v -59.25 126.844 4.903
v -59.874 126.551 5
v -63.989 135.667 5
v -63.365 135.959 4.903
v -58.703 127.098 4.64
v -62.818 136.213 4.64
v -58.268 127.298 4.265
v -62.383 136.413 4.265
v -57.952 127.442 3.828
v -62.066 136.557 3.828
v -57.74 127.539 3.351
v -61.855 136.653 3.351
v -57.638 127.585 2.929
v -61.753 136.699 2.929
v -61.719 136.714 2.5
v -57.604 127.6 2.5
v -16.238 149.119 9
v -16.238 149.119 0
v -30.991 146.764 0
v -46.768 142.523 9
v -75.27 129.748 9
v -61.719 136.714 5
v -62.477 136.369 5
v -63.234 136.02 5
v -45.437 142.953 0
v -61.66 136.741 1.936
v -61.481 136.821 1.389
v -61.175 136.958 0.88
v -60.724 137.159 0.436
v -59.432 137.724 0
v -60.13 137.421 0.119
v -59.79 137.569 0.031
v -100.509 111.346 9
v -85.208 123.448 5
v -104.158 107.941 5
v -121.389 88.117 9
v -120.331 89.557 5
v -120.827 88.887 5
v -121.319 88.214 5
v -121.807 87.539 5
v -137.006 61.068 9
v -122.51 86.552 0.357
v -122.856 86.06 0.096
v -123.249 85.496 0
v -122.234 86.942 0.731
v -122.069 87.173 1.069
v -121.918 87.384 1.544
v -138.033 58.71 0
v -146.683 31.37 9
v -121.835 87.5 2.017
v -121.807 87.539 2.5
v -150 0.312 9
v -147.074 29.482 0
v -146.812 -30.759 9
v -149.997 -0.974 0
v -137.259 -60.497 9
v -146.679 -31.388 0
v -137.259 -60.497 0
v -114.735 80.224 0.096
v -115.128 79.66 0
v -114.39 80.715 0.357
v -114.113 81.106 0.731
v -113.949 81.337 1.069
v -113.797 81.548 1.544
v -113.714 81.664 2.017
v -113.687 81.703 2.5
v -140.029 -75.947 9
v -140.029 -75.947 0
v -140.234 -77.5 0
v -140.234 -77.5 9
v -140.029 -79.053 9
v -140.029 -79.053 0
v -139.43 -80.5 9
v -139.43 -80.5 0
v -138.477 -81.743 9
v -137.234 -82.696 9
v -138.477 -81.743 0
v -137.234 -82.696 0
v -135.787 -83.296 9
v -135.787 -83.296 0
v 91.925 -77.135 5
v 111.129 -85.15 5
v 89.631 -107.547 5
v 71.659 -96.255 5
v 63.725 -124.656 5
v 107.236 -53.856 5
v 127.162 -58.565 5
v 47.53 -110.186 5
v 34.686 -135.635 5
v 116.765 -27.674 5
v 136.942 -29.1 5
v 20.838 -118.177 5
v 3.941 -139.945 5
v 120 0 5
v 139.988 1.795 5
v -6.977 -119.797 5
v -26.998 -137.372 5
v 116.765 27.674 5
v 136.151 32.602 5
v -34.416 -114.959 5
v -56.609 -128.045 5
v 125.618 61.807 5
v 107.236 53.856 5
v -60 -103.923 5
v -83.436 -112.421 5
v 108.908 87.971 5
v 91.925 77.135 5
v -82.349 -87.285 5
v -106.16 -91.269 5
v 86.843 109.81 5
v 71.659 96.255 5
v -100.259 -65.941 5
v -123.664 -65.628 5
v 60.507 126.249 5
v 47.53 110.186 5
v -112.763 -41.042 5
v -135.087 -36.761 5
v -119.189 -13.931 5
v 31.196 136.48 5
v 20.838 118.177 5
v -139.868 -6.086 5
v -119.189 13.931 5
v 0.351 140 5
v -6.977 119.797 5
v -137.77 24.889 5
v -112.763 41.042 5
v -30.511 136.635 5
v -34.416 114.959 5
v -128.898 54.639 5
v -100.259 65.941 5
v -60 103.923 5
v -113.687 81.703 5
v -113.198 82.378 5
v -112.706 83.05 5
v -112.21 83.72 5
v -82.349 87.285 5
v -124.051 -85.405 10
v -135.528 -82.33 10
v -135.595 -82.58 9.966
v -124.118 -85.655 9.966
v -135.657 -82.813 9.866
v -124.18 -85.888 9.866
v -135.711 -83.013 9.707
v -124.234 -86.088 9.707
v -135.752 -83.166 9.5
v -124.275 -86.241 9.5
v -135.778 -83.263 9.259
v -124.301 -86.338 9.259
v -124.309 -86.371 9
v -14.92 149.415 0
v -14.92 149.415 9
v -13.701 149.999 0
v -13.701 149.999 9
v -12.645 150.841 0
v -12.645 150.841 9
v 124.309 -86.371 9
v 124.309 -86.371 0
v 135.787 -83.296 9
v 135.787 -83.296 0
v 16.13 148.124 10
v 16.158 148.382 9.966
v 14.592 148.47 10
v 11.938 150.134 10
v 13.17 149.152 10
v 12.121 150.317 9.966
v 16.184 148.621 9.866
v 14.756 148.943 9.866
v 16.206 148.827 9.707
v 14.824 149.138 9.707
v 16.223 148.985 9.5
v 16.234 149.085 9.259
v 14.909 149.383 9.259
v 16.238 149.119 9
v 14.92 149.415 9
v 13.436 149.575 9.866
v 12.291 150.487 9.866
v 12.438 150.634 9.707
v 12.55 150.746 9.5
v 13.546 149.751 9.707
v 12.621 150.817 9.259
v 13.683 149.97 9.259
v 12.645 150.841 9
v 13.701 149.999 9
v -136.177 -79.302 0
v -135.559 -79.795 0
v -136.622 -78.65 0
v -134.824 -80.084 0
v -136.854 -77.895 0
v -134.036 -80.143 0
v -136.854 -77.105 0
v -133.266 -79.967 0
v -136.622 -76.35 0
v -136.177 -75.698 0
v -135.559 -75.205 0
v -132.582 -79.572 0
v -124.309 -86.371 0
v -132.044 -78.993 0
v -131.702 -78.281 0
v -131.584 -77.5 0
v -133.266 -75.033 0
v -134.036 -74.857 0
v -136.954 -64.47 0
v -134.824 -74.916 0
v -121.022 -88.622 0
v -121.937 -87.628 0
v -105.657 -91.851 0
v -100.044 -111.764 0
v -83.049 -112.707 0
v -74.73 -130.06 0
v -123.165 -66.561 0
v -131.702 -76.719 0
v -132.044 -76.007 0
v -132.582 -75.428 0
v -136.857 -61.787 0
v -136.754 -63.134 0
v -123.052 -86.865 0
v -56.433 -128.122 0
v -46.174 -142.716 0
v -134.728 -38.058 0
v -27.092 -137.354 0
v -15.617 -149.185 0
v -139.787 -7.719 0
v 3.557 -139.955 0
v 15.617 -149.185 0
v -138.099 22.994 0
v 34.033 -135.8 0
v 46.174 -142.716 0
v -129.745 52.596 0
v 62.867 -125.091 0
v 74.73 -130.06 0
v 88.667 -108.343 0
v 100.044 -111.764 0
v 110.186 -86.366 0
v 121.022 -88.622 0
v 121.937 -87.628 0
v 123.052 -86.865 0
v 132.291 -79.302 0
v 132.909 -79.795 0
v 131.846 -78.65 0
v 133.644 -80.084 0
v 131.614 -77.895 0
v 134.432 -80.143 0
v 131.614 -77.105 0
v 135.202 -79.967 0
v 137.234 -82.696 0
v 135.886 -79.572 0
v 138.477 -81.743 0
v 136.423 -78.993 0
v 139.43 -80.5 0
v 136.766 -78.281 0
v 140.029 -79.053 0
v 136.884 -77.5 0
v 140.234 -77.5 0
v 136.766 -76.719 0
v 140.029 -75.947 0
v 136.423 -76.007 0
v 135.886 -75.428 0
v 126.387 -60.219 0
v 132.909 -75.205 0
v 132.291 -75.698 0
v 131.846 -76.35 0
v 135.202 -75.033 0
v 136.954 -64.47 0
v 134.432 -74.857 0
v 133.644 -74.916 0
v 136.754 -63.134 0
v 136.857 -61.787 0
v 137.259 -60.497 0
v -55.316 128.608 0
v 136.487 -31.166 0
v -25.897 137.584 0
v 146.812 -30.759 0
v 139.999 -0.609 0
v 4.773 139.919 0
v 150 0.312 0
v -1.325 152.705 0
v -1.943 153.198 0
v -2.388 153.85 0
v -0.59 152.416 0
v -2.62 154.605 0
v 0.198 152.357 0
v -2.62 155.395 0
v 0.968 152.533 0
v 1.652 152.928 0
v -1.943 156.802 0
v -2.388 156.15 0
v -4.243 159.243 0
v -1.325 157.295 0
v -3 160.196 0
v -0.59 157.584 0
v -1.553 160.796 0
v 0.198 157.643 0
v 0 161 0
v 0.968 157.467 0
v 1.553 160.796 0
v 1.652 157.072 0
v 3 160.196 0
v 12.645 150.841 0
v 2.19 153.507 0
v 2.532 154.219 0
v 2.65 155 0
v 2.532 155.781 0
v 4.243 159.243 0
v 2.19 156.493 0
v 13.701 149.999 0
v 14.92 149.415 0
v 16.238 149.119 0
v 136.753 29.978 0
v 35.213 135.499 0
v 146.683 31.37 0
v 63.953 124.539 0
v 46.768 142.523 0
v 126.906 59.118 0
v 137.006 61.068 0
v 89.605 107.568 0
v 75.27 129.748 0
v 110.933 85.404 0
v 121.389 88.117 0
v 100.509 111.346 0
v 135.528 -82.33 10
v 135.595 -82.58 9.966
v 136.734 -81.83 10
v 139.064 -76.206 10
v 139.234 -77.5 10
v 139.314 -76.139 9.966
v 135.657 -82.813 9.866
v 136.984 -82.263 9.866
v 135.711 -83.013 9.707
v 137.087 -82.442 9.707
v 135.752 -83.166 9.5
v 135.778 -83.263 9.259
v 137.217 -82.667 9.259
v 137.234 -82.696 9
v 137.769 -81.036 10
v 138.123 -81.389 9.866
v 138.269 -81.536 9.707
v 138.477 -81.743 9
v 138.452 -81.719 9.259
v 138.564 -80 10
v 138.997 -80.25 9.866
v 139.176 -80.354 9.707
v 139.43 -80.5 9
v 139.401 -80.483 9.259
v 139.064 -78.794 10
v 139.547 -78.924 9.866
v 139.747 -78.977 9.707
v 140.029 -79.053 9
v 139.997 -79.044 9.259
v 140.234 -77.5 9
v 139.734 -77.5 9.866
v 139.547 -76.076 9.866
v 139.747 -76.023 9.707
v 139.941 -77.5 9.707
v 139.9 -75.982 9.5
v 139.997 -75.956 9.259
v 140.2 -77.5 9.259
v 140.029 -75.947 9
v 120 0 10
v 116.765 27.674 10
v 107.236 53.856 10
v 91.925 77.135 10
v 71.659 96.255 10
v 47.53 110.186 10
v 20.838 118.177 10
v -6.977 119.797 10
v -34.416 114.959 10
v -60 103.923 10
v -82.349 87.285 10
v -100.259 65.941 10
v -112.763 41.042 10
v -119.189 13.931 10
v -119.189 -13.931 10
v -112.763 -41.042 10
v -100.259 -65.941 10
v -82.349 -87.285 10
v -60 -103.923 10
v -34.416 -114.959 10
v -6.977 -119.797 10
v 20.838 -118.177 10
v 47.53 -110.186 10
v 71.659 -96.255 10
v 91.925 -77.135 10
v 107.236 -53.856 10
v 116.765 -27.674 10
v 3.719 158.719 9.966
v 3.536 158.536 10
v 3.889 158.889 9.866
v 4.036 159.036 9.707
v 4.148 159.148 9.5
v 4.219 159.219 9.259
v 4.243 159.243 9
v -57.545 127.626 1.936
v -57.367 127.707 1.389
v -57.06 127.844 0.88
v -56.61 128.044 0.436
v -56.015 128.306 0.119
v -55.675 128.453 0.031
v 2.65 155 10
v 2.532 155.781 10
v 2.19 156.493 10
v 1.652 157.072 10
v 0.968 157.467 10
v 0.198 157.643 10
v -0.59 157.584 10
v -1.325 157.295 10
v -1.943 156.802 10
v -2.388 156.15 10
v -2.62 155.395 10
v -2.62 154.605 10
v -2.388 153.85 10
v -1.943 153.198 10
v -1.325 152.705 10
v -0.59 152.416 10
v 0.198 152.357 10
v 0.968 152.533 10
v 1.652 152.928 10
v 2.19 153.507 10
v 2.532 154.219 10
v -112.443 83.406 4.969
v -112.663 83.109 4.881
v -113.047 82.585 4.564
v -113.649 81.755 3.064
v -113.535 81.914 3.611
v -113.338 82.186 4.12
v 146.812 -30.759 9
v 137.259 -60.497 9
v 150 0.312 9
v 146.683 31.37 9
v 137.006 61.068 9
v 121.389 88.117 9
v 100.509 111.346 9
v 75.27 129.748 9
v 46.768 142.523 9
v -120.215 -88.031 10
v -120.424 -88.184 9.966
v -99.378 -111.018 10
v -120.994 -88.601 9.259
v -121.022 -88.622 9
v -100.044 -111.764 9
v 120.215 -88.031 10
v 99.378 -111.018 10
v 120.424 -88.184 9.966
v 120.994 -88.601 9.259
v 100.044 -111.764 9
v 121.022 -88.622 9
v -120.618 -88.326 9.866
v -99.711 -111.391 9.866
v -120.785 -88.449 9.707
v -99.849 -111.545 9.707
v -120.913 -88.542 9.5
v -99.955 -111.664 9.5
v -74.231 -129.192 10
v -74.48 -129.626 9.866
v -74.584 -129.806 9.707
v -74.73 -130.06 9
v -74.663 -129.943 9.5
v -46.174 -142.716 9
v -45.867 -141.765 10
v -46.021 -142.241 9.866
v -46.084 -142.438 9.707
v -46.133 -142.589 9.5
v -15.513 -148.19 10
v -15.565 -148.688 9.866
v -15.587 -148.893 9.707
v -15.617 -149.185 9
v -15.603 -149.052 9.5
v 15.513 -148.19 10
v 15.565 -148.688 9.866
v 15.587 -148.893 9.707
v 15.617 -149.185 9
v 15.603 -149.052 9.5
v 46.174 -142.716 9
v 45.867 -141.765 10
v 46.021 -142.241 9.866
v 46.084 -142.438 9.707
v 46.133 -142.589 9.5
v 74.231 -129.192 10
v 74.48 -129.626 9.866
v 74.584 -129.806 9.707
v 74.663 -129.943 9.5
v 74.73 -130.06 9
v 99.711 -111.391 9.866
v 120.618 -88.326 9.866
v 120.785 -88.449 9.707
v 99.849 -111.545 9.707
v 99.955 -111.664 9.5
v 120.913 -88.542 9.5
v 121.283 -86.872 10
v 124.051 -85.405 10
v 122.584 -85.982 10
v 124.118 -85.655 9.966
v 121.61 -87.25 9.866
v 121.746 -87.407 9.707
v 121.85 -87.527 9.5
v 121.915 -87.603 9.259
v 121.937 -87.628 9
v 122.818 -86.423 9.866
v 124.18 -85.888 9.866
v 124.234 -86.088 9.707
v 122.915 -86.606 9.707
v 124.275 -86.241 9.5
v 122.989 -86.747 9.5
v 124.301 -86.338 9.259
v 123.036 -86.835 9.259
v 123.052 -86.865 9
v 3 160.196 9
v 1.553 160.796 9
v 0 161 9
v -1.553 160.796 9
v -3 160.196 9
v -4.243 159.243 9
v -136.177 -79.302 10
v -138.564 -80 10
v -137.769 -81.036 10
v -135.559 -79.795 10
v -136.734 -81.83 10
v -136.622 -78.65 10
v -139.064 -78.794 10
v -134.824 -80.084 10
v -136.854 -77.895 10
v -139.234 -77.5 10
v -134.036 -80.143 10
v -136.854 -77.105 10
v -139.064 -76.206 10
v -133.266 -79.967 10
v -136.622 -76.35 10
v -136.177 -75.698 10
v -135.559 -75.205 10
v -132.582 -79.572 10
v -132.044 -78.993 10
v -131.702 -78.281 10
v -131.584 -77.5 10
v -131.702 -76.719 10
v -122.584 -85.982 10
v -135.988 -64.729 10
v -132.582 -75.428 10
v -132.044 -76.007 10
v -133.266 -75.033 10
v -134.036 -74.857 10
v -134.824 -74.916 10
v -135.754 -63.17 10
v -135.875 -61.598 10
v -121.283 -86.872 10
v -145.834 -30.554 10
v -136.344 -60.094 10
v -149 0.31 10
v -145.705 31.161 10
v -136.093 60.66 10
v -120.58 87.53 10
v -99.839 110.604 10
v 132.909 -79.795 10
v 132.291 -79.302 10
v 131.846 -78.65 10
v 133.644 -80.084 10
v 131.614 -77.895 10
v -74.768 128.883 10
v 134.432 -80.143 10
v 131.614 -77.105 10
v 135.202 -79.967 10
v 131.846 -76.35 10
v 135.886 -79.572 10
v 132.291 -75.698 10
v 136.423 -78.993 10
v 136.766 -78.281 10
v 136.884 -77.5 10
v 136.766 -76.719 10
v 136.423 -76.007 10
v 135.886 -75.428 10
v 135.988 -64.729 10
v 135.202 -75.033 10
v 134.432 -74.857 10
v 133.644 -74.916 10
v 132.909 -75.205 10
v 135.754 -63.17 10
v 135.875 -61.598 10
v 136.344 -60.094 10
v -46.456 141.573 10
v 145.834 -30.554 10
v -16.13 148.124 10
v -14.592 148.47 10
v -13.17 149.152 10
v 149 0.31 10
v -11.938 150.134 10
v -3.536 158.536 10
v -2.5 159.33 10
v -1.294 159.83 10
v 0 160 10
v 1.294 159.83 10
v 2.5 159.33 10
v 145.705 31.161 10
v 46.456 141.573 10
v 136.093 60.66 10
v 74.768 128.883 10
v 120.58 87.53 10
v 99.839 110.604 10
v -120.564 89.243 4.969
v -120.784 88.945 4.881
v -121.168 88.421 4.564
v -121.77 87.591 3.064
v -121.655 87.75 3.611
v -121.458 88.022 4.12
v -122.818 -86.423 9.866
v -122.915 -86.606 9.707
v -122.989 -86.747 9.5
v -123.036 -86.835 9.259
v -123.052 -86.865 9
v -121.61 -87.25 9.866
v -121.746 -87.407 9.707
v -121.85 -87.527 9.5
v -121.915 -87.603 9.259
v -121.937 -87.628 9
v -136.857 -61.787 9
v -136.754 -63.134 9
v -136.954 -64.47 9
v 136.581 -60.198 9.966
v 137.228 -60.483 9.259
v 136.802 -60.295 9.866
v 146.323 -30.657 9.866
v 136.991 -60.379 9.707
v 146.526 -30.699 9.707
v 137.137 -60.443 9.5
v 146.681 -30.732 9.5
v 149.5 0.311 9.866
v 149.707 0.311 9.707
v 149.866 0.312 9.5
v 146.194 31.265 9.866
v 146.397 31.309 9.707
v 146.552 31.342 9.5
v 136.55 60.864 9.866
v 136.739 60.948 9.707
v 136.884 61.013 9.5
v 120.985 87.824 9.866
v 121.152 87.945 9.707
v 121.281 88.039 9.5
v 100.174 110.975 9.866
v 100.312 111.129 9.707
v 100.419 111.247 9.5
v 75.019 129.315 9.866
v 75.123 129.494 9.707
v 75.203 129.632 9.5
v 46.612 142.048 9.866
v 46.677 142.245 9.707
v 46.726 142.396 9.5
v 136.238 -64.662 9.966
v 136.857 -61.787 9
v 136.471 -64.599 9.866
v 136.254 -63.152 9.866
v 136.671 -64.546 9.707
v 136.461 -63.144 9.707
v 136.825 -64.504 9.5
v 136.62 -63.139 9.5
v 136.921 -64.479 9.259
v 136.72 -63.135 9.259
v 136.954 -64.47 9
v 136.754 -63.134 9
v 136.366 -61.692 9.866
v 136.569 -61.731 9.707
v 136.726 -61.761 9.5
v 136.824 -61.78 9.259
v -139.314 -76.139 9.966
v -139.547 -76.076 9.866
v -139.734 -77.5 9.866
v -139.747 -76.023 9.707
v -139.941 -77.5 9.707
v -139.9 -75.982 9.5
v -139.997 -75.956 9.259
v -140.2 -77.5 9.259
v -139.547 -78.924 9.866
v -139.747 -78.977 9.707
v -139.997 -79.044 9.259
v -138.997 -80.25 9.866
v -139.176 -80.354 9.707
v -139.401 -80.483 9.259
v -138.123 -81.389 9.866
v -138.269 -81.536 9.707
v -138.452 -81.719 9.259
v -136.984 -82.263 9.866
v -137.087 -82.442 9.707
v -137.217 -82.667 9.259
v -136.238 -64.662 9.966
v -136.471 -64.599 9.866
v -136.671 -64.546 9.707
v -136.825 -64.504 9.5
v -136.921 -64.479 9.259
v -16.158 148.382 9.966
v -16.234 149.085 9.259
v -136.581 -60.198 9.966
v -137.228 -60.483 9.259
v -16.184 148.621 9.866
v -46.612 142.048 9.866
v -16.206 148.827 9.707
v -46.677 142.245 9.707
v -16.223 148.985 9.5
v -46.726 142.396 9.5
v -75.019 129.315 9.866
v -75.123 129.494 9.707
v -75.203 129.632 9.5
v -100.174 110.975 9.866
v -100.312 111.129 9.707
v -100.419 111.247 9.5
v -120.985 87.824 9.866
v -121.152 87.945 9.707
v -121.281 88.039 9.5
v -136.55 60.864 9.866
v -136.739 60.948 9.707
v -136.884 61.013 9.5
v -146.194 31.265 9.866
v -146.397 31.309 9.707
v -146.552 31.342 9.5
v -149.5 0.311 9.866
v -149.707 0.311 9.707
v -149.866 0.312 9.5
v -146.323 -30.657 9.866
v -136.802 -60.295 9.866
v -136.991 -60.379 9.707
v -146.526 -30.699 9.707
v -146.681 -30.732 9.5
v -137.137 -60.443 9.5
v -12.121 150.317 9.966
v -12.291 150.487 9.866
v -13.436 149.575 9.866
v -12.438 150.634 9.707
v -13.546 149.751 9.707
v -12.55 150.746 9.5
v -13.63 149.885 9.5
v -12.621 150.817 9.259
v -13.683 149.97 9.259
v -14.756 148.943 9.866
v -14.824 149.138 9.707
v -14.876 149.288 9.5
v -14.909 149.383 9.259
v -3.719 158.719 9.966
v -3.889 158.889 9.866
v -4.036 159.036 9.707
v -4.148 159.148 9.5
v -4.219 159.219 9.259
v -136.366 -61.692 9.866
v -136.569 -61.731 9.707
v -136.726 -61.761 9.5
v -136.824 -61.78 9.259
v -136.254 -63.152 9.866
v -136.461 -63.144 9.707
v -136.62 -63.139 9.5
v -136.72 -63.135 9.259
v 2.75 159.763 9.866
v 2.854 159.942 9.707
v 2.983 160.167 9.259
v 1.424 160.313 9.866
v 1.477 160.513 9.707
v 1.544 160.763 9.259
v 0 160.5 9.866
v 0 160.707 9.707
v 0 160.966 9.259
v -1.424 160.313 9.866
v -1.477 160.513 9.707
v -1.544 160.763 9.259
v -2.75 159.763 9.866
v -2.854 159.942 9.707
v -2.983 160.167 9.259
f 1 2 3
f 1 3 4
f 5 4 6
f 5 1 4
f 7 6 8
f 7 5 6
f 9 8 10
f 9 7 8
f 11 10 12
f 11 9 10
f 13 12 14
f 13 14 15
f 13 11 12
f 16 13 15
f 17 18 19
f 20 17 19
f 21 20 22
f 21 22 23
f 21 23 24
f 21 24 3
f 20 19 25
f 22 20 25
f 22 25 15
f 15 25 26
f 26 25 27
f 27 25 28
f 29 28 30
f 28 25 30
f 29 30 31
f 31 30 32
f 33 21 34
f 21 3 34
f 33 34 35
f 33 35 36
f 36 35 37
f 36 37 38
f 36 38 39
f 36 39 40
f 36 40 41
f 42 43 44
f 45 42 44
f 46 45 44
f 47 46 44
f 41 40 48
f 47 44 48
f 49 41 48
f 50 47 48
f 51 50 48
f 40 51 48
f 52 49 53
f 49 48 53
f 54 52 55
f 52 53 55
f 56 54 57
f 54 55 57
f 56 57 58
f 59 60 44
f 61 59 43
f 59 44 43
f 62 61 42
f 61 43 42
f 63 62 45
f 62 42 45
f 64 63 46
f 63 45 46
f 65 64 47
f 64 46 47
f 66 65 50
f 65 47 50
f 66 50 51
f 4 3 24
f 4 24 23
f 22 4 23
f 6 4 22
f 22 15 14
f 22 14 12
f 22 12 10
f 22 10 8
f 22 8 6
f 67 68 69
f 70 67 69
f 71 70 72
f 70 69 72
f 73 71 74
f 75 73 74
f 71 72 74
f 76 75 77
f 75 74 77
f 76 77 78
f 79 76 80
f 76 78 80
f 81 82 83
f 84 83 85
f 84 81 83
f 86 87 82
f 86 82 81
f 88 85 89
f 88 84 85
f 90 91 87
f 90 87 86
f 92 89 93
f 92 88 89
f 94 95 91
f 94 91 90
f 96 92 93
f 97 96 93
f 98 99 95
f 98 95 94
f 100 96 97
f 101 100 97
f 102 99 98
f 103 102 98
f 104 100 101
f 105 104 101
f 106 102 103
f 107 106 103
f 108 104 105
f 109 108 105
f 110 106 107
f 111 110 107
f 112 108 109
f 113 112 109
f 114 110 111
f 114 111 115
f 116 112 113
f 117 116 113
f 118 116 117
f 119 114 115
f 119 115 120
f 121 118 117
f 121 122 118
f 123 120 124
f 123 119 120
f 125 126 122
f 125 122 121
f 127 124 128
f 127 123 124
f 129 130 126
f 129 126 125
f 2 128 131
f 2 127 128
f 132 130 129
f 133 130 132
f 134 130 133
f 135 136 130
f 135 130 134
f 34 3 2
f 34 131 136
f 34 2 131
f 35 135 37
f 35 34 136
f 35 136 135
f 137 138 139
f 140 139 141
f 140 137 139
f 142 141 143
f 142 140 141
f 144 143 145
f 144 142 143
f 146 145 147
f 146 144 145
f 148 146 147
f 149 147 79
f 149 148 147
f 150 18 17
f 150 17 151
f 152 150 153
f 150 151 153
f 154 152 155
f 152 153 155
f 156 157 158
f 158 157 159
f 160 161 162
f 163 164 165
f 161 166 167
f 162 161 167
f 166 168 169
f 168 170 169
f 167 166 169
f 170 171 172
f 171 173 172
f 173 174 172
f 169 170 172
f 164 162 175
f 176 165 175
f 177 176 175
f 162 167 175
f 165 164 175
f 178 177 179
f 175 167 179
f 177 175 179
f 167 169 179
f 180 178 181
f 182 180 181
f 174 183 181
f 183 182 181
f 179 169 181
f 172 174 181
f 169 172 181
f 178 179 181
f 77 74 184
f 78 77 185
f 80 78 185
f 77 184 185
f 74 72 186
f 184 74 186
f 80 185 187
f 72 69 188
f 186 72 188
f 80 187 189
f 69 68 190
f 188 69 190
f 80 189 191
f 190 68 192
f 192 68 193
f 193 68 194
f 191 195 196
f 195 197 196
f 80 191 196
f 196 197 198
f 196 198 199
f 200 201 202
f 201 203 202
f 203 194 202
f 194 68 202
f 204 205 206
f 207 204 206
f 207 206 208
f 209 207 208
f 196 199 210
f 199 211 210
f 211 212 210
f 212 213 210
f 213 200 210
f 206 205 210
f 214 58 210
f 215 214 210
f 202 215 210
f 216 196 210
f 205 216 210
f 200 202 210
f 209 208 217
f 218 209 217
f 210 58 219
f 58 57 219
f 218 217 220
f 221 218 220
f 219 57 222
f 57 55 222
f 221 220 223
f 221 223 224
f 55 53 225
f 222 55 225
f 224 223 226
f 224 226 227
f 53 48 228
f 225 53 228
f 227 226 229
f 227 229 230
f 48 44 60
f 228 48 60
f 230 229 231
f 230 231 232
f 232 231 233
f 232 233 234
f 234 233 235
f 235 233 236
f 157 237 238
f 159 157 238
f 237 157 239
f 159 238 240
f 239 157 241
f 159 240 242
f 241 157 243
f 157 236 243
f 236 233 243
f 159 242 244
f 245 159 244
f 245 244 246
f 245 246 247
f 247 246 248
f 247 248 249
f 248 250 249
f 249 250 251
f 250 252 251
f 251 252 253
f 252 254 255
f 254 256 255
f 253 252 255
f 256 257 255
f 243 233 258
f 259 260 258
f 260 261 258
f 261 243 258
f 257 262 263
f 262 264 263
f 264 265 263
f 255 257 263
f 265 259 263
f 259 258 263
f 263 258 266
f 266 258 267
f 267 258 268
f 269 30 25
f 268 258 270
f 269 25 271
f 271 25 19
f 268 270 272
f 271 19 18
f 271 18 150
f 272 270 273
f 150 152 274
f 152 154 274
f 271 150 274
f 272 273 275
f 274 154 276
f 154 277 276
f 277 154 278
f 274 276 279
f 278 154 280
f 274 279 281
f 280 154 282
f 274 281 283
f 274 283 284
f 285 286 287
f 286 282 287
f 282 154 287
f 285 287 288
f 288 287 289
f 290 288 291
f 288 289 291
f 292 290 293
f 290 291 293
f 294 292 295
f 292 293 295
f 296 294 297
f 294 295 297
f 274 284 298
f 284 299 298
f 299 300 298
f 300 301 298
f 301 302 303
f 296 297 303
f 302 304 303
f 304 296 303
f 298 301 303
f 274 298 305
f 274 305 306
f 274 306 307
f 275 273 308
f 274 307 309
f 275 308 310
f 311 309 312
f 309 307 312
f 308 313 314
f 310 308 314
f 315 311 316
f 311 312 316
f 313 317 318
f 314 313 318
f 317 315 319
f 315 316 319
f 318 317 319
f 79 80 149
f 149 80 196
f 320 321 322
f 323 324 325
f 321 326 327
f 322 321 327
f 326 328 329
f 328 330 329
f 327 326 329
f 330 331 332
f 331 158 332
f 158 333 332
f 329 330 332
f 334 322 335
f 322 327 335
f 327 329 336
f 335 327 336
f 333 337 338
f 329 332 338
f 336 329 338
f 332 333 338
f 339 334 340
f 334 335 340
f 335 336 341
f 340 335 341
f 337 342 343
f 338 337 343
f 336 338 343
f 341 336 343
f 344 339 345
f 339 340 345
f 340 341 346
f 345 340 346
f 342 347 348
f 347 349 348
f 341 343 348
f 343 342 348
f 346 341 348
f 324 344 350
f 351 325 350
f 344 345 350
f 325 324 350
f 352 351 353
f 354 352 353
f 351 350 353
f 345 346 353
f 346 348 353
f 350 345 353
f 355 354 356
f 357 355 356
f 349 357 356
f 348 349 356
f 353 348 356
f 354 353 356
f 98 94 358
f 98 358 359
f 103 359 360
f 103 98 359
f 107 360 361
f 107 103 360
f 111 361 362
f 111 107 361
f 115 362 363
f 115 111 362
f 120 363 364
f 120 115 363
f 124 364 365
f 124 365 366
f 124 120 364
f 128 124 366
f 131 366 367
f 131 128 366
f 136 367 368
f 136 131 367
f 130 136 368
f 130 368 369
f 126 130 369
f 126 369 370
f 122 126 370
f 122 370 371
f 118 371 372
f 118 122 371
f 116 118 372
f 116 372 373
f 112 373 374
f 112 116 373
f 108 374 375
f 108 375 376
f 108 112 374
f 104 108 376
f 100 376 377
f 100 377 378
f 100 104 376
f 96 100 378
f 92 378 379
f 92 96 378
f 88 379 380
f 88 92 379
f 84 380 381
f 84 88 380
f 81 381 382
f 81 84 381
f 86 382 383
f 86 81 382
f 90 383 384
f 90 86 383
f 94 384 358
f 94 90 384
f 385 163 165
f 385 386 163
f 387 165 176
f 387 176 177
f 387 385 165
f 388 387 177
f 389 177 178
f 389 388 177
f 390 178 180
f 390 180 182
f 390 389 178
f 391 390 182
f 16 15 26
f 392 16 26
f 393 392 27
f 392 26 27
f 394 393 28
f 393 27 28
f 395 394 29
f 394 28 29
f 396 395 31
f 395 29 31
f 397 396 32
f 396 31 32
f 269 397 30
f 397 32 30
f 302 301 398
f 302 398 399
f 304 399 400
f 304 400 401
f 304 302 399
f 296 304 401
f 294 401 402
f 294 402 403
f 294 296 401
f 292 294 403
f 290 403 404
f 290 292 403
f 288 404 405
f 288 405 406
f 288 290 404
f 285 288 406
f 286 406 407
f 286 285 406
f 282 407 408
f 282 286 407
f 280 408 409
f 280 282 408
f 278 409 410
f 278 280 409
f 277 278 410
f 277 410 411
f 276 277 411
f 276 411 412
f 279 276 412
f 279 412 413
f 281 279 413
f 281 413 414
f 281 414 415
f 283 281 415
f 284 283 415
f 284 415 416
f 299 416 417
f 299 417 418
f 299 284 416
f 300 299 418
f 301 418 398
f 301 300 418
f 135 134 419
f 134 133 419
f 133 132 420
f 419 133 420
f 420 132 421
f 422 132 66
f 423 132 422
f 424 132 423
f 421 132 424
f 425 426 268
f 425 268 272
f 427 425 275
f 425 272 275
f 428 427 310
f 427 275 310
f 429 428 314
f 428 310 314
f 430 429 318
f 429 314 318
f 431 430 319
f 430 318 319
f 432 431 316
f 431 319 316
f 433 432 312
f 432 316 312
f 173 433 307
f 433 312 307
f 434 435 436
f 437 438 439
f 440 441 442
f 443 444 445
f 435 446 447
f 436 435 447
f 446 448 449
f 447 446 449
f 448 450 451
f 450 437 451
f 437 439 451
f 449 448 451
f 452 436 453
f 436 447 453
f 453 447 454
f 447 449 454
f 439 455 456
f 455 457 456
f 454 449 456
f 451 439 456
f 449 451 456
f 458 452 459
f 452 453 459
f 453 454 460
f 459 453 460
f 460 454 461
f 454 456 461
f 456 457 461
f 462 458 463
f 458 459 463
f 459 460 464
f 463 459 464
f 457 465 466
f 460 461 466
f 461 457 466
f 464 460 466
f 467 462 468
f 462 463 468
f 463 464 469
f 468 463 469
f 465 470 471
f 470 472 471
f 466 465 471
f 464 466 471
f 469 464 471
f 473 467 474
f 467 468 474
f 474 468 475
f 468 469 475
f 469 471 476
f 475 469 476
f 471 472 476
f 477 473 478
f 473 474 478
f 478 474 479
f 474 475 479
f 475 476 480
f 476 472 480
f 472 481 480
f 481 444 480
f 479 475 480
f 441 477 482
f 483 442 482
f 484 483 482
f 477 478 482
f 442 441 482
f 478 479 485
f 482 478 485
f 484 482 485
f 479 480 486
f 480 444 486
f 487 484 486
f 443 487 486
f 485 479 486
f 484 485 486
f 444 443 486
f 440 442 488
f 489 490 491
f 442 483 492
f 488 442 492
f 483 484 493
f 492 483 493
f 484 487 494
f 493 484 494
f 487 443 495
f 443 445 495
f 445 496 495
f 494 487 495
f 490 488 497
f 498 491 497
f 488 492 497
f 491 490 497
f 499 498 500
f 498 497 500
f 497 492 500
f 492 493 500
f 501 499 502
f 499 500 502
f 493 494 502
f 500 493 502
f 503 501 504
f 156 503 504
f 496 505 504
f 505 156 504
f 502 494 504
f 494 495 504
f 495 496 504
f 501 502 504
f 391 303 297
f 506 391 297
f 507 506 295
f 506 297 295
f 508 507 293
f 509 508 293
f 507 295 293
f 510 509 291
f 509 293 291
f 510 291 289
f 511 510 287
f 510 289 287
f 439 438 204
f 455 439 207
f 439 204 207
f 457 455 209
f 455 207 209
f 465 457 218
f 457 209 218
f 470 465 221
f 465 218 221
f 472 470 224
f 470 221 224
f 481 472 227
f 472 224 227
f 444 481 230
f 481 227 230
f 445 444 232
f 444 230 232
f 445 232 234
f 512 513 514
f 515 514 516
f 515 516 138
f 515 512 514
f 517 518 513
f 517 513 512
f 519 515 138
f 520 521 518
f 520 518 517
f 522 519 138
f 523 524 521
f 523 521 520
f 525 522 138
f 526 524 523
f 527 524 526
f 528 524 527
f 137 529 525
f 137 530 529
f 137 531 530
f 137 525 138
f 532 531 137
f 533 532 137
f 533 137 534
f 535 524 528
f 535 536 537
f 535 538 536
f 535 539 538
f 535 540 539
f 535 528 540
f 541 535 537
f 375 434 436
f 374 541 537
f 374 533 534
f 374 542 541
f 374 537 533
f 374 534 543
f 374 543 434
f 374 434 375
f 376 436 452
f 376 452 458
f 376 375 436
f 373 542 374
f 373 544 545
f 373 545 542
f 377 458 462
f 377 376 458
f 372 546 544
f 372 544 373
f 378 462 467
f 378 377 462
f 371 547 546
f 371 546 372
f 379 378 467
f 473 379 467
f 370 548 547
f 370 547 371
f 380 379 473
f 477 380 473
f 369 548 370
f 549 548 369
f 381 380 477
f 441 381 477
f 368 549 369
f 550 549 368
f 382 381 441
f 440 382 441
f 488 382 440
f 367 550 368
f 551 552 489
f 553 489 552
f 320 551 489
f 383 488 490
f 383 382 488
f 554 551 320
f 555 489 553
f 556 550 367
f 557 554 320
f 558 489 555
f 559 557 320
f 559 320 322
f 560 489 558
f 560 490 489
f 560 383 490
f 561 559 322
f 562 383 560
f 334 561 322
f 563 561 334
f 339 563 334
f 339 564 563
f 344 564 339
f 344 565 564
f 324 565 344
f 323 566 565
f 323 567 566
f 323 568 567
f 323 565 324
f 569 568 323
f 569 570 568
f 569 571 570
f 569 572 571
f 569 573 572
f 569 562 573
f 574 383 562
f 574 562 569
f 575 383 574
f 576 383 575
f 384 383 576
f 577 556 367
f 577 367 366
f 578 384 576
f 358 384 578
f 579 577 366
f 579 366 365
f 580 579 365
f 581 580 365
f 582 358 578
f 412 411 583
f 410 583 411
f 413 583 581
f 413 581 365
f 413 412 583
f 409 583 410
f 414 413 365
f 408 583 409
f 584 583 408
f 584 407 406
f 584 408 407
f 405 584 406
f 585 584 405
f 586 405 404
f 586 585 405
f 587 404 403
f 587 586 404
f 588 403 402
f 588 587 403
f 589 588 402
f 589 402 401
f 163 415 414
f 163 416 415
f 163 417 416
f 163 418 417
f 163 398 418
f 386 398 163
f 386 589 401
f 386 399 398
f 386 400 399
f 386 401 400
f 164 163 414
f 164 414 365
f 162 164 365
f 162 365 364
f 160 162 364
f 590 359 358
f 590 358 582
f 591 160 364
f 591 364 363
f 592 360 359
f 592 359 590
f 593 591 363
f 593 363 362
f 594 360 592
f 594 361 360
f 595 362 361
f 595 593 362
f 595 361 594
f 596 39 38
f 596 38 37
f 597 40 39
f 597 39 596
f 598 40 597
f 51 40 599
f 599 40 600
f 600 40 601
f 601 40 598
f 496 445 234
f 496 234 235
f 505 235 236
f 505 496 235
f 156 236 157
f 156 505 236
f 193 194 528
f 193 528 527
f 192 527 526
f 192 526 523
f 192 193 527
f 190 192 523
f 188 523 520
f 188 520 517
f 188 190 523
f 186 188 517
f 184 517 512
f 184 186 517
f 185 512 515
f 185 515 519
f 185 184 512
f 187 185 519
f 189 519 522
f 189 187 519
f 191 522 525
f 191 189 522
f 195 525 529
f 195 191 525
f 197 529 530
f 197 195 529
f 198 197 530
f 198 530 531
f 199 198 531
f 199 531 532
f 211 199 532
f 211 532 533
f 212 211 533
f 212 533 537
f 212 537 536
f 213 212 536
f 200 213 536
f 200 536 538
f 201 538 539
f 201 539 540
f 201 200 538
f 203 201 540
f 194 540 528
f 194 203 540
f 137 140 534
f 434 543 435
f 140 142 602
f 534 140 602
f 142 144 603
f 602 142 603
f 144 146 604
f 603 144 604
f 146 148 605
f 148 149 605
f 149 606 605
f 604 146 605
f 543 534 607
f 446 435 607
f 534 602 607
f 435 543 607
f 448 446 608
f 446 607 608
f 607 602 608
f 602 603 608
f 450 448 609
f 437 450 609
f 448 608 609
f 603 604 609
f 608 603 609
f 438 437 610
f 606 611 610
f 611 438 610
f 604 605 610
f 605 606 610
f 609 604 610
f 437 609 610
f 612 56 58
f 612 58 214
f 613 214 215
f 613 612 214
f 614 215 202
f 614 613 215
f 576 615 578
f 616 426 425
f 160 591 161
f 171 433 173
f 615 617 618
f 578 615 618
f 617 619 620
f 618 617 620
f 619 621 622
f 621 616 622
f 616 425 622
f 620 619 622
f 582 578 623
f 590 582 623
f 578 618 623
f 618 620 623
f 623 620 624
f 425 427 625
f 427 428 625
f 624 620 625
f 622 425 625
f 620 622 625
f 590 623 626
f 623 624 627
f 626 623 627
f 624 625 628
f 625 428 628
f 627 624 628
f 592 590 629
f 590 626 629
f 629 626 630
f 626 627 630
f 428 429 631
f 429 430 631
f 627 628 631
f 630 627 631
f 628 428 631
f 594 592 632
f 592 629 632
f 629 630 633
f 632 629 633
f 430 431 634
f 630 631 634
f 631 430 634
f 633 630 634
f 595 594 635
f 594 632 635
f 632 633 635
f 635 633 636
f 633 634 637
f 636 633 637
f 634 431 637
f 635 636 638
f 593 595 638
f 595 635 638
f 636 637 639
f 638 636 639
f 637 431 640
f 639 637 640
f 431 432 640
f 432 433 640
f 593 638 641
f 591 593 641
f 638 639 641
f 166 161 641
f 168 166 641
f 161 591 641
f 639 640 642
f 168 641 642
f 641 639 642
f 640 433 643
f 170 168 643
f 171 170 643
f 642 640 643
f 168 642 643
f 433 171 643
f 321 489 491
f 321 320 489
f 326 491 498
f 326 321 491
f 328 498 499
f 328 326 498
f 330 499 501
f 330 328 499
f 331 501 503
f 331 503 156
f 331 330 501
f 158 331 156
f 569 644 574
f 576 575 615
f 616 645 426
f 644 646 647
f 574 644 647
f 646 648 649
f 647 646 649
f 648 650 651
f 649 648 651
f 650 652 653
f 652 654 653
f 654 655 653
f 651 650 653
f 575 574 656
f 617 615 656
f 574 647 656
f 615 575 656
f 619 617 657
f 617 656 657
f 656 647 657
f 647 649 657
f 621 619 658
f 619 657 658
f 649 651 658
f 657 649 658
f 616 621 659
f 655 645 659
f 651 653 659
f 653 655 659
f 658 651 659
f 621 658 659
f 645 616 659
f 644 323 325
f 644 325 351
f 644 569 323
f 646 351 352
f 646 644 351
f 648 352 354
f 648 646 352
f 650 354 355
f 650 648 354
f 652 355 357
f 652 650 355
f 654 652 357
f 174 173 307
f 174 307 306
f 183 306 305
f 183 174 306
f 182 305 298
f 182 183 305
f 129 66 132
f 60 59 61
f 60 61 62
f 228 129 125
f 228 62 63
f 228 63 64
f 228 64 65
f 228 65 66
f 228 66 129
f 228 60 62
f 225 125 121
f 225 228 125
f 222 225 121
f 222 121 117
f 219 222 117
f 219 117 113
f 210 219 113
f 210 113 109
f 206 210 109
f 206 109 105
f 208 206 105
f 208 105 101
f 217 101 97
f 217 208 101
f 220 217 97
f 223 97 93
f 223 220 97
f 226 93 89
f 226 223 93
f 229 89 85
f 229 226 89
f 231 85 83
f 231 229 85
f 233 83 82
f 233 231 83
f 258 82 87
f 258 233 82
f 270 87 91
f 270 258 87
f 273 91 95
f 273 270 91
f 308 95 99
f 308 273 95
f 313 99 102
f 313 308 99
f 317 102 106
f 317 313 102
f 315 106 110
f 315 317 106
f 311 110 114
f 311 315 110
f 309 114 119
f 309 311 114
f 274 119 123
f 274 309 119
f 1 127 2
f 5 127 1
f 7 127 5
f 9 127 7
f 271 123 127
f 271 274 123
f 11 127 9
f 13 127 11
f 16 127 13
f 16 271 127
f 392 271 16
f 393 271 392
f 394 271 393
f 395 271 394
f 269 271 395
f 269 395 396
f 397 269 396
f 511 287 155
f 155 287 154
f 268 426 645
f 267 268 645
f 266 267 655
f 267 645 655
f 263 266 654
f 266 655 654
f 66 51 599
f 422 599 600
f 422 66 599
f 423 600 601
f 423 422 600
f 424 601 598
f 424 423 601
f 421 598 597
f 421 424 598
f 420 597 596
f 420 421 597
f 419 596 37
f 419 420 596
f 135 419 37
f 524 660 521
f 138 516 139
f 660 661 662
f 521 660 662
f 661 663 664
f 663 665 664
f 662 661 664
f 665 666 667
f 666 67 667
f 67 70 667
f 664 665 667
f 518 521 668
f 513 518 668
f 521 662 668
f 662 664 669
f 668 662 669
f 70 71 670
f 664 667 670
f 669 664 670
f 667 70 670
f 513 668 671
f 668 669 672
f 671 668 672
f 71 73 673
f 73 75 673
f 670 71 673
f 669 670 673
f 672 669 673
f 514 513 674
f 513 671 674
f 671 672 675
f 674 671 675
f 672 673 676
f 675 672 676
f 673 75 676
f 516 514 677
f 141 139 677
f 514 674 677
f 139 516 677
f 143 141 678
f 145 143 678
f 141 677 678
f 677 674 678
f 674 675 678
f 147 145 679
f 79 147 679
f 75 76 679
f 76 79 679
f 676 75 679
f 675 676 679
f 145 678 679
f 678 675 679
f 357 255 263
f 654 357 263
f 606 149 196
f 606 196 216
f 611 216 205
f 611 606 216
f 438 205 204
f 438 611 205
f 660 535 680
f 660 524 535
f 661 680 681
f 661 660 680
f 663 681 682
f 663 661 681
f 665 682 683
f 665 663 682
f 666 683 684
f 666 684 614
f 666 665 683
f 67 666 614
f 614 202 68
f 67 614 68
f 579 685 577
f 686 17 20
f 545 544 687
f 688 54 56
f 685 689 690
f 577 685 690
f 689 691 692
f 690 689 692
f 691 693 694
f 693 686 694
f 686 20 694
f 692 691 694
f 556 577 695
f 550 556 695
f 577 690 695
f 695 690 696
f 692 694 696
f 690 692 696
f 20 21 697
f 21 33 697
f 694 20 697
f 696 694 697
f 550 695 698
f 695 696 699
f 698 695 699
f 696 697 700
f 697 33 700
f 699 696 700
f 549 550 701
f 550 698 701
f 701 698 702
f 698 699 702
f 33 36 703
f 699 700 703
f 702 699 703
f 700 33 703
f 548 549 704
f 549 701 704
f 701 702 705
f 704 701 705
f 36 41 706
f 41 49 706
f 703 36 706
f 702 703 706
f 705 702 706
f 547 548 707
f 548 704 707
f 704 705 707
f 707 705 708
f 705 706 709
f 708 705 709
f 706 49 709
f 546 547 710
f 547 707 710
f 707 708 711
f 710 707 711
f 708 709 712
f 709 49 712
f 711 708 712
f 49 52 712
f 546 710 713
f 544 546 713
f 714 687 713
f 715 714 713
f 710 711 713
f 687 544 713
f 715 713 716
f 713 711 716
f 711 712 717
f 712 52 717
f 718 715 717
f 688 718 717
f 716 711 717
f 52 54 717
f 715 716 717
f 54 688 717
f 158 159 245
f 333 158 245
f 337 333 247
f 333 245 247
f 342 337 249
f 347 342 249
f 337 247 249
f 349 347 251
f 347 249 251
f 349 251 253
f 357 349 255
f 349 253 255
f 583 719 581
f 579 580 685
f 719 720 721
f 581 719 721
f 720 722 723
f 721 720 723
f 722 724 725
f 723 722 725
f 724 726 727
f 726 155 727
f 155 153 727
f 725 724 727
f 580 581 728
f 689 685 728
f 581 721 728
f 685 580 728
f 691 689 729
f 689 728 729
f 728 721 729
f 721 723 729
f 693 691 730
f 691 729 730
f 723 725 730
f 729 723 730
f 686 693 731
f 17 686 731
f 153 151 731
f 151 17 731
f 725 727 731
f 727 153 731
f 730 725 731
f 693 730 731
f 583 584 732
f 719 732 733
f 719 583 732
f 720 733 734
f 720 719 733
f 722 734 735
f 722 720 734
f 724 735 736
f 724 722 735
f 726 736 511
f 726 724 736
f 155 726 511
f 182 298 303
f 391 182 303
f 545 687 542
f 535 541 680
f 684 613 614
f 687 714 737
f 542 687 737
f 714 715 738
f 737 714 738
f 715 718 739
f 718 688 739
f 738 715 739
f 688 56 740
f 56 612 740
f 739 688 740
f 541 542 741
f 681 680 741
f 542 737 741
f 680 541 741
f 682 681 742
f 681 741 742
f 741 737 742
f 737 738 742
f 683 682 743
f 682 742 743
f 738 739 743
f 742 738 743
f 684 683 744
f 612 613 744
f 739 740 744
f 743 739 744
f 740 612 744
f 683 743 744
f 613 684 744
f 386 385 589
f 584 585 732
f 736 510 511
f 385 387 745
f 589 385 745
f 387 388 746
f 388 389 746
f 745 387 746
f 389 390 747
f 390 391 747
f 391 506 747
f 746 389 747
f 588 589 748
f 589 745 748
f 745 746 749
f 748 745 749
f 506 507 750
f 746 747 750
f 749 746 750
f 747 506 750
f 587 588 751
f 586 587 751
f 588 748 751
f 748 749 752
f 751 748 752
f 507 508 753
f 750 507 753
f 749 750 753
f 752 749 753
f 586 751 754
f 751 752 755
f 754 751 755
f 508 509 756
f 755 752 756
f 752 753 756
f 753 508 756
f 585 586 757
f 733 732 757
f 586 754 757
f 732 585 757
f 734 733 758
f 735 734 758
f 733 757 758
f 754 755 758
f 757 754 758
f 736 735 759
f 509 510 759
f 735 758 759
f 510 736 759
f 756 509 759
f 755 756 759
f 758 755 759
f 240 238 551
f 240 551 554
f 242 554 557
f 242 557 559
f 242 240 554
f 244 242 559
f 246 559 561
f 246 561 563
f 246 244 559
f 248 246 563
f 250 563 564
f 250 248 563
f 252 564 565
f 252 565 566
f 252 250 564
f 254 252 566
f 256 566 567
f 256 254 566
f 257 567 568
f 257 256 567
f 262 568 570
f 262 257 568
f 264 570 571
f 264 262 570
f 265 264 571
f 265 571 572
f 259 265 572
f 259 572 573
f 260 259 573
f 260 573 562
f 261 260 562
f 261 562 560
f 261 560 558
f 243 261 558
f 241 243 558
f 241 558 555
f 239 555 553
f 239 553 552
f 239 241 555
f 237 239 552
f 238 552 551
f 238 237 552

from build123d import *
from build123d.topology import SkipClean

# Parameters (mm, degrees)
SKETCH1_R                = 150
SKETCH1_R_2              = 140
BOSS_EXTRUDE1_DEPTH      = 5
SKETCH2_R                = 150
SKETCH2_R_2              = 120
BOSS_EXTRUDE2_DEPTH      = 5
BOSS_EXTRUDE3_START      = -10
SKETCH3_R                = 2.65
BOSS_EXTRUDE3_DEPTH      = 10
FILLET1_R                = 6
CIRPATTERN1_COUNT        = 3
FILLET1_OF_CIRPATTERN1_R = 6
FILLET2_R                = 1
CUT_EXTRUDE2_DEPTH       = 5
FILLET3_R                = 2.5


with BuildPart() as part:
    # Sketch1 → Boss-Extrude1 (new body)
    with BuildSketch(Plane.XY):
        Circle(SKETCH1_R)
        Circle(SKETCH1_R_2, mode=Mode.SUBTRACT)
    extrude(amount=BOSS_EXTRUDE1_DEPTH)

    # Sketch2 → Boss-Extrude2 (add)
    with BuildSketch(Plane.XY.offset(5)):
        Circle(SKETCH2_R)
        Circle(SKETCH2_R_2, mode=Mode.SUBTRACT)
    extrude(amount=BOSS_EXTRUDE2_DEPTH)

    # Sketch3 → Boss-Extrude3 (add)
    with BuildSketch(Plane.XY.offset(10).offset(BOSS_EXTRUDE3_START)):
        with BuildLine():
            ThreePointArc((-14.154618867, 149.330662507), (0, 150), (14.154618867, 149.330662507))
            Line((14.154618867, 149.330662507), (4.242640687, 159.242640687))
            ThreePointArc((4.242640687, 159.242640687), (0, 161), (-4.242640687, 159.242640687))
            Line((-4.242640687, 159.242640687), (-14.154618867, 149.330662507))
        make_face()
        with Locations((0, 155)):
            Circle(SKETCH3_R, mode=Mode.SUBTRACT)
    boss_extrude3 = extrude(amount=BOSS_EXTRUDE3_DEPTH)

    # Fillet1
    fillet1_edges = [part.edges().sort_by_distance(p)[0] for p in [
        (-14.154618867, 149.330662507, 5),
        (14.154618867, 149.330662507, 5),
    ]]
    fillet(fillet1_edges, radius=FILLET1_R)

    # CirPattern1: Boss-Extrude3 ×3 about axis
    cirpattern1_axis = Axis((0, 0, 0), (0, 0, 1))
    for i in range(1, CIRPATTERN1_COUNT):
        add(boss_extrude3.rotate(cirpattern1_axis, i * 360 / CIRPATTERN1_COUNT))

    # Fillet1 of CirPattern1
    fillet1_of_cirpattern1_edges = [part.edges().sort_by_distance(p)[0] for p in [
        (-122.246837861, -86.923590773, 5),
        (-136.401456729, -62.407071733, 5),
        (136.401456729, -62.407071733, 5),
        (122.246837861, -86.923590773, 5),
    ]]
    fillet(fillet1_of_cirpattern1_edges, radius=FILLET1_OF_CIRPATTERN1_R)

    # Fillet2
    fillet2_edges = [part.edges().sort_by_distance(p)[0] for p in [
        (8.443648708, 155.041632666, 10),
        (0, 161, 10),
        (-8.443648708, 155.041632666, 10),
        (-129.903810568, 75, 10),
        (-14.29409564, 149.672599518, 10),
        (14.29409564, 149.672599518, 10),
        (-138.491816887, -70.208402051, 10),
        (-139.430090009, -80.5, 10),
        (-130.048168179, -84.833230615, 10),
        (130.048168179, -84.833230615, 10),
        (139.430090009, -80.5, 10),
        (138.491816887, -70.208402051, 10),
        (0, -150, 10),
        (-122.473225614, -87.215349707, 10),
        (-136.767321253, -62.457249811, 10),
        (129.903810568, 75, 10),
        (136.767321253, -62.457249811, 10),
        (122.473225614, -87.215349707, 10),
    ]]
    fillet(fillet2_edges, radius=FILLET2_R)

    # Sketch4 → Cut-Extrude2 (cut)
    with SkipClean():  # the faces are left unmerged after this step: merging them gives an invalid solid
        with BuildSketch(Plane(origin=(0, 0, 0), x_dir=(-1, 0, 0), z_dir=(0, 0, -1))):
            with BuildLine():
                ThreePointArc((57.604193668, 127.599987743), (88.666685349, 108.343061196), (113.686688952, 81.702734074))
                Line((113.686688952, 81.702734074), (121.807166734, 87.538643651))
                ThreePointArc((121.807166734, 87.538643651), (95.000020016, 116.081851281), (61.718778929, 136.714272581))
                Line((61.718778929, 136.714272581), (57.604193668, 127.599987743))
            make_face()
            with BuildLine():
                ThreePointArc((55.546901037, 123.042845323), (85.500018015, 104.473666153), (109.626450061, 78.784779286))
                Line((109.626450061, 78.784779286), (113.686688952, 81.702734074))
                ThreePointArc((113.686688952, 81.702734074), (88.666685349, 108.343061196), (57.604193668, 127.599987743))
                Line((57.604193668, 127.599987743), (55.546901037, 123.042845323))
            make_face()
            with BuildLine():
                Line((113.686688952, 81.702734074), (109.626450061, 78.784779286))
                ThreePointArc((109.626450061, 78.784779286), (128.500137662, 41.384956456), (135, 0))
                ThreePointArc((135, 0), (-113.410386738, -73.233081186), (55.546901037, 123.042845323))
                Line((55.546901037, 123.042845323), (57.604193668, 127.599987743))
                ThreePointArc((57.604193668, 127.599987743), (-117.610771432, -75.945417526), (140, 0))
                ThreePointArc((140, 0), (133.25940202, 42.917732621), (113.686688952, 81.702734074))
            make_face()
        extrude(amount=-CUT_EXTRUDE2_DEPTH, mode=Mode.SUBTRACT)

    # Fillet3
    # the kernel refuses this fillet: 2.5 mm, written as the material it adds along each edge
    with BuildSketch(Plane(origin=(-55.032577879, 121.903559718, 5), x_dir=(0, 0, -1), z_dir=(-0.41145852619651707, 0.9114284838758278, 0))) as fillet3_piece_1_section:
        with BuildLine():
            CenterArc((FILLET3_R, FILLET3_R), FILLET3_R, 180, 90)
            Line((0, FILLET3_R), (0, 0))
            Line((0, 0), (FILLET3_R, 0))
        make_face()
    fillet3_piece_1 = extrude(amount=22.5, mode=Mode.PRIVATE)
    fillet3_piece_1 = fillet3_piece_1 & Plane(origin=(0, 0, 4.434016132), x_dir=(1, 0, 0), z_dir=(0, 0, -1)) * Cylinder(150, 56, mode=Mode.PRIVATE)
    fillet3_piece_1 = fillet3_piece_1 - Plane(origin=(0, 0, 4.434016132), x_dir=(1, 0, 0), z_dir=(0, 0, -1)) * Cylinder(140, 56, mode=Mode.PRIVATE)
    add(fillet3_piece_1)
    with BuildSketch(Plane(origin=(-108.611390338, 78.055290588, 5), x_dir=(0, 0, -1), z_dir=(-0.8120477782278018, 0.5835909576709453, 0))) as fillet3_piece_2_section:
        with BuildLine():
            CenterArc((FILLET3_R, -FILLET3_R), FILLET3_R, 90, 90)
            Line((0, -FILLET3_R), (0, 0))
            Line((0, 0), (FILLET3_R, 0))
        make_face()
    fillet3_piece_2 = extrude(amount=22.5, mode=Mode.PRIVATE)
    fillet3_piece_2 = fillet3_piece_2 & Plane(origin=(0, 0, 4.434018279), x_dir=(1, 0, 0), z_dir=(0, 0, -1)) * Cylinder(150, 55, mode=Mode.PRIVATE)
    fillet3_piece_2 = fillet3_piece_2 - Plane(origin=(0, 0, 4.434018279), x_dir=(-0.41145852619650086, 0.9114284838758352, 0), z_dir=(0, 0, -1)) * Cylinder(140, 55, mode=Mode.PRIVATE)
    add(fillet3_piece_2)
    # the kernel refuses this fillet: 2.5 mm, written as the material it takes off along each edge
    with BuildSketch(Plane(origin=(-64.290394718, 142.410700606, 0), x_dir=(0.9114284838758278, 0.4114585261965171, 0), z_dir=(0.41145852619651707, -0.9114284838758278, 0))) as fillet3_2_piece_1:
        with BuildLine():
            CenterArc((FILLET3_R, FILLET3_R), FILLET3_R, 180, 90)
            Line((0, FILLET3_R), (0, 0))
            Line((0, 0), (FILLET3_R, 0))
        make_face()
    extrude(amount=22.5, mode=Mode.SUBTRACT)
    with BuildSketch(Plane(origin=(-126.882465348, 91.186087136, 0), x_dir=(-0.5835909576709452, -0.8120477782278016, 0), z_dir=(0.8120477782278018, -0.5835909576709453, 0))) as fillet3_2_piece_2:
        with BuildLine():
            CenterArc((FILLET3_R, -FILLET3_R), FILLET3_R, 90, 90)
            Line((0, -FILLET3_R), (0, 0))
            Line((0, 0), (FILLET3_R, 0))
        make_face()
    extrude(amount=22.5, mode=Mode.SUBTRACT)


solid = part.part
